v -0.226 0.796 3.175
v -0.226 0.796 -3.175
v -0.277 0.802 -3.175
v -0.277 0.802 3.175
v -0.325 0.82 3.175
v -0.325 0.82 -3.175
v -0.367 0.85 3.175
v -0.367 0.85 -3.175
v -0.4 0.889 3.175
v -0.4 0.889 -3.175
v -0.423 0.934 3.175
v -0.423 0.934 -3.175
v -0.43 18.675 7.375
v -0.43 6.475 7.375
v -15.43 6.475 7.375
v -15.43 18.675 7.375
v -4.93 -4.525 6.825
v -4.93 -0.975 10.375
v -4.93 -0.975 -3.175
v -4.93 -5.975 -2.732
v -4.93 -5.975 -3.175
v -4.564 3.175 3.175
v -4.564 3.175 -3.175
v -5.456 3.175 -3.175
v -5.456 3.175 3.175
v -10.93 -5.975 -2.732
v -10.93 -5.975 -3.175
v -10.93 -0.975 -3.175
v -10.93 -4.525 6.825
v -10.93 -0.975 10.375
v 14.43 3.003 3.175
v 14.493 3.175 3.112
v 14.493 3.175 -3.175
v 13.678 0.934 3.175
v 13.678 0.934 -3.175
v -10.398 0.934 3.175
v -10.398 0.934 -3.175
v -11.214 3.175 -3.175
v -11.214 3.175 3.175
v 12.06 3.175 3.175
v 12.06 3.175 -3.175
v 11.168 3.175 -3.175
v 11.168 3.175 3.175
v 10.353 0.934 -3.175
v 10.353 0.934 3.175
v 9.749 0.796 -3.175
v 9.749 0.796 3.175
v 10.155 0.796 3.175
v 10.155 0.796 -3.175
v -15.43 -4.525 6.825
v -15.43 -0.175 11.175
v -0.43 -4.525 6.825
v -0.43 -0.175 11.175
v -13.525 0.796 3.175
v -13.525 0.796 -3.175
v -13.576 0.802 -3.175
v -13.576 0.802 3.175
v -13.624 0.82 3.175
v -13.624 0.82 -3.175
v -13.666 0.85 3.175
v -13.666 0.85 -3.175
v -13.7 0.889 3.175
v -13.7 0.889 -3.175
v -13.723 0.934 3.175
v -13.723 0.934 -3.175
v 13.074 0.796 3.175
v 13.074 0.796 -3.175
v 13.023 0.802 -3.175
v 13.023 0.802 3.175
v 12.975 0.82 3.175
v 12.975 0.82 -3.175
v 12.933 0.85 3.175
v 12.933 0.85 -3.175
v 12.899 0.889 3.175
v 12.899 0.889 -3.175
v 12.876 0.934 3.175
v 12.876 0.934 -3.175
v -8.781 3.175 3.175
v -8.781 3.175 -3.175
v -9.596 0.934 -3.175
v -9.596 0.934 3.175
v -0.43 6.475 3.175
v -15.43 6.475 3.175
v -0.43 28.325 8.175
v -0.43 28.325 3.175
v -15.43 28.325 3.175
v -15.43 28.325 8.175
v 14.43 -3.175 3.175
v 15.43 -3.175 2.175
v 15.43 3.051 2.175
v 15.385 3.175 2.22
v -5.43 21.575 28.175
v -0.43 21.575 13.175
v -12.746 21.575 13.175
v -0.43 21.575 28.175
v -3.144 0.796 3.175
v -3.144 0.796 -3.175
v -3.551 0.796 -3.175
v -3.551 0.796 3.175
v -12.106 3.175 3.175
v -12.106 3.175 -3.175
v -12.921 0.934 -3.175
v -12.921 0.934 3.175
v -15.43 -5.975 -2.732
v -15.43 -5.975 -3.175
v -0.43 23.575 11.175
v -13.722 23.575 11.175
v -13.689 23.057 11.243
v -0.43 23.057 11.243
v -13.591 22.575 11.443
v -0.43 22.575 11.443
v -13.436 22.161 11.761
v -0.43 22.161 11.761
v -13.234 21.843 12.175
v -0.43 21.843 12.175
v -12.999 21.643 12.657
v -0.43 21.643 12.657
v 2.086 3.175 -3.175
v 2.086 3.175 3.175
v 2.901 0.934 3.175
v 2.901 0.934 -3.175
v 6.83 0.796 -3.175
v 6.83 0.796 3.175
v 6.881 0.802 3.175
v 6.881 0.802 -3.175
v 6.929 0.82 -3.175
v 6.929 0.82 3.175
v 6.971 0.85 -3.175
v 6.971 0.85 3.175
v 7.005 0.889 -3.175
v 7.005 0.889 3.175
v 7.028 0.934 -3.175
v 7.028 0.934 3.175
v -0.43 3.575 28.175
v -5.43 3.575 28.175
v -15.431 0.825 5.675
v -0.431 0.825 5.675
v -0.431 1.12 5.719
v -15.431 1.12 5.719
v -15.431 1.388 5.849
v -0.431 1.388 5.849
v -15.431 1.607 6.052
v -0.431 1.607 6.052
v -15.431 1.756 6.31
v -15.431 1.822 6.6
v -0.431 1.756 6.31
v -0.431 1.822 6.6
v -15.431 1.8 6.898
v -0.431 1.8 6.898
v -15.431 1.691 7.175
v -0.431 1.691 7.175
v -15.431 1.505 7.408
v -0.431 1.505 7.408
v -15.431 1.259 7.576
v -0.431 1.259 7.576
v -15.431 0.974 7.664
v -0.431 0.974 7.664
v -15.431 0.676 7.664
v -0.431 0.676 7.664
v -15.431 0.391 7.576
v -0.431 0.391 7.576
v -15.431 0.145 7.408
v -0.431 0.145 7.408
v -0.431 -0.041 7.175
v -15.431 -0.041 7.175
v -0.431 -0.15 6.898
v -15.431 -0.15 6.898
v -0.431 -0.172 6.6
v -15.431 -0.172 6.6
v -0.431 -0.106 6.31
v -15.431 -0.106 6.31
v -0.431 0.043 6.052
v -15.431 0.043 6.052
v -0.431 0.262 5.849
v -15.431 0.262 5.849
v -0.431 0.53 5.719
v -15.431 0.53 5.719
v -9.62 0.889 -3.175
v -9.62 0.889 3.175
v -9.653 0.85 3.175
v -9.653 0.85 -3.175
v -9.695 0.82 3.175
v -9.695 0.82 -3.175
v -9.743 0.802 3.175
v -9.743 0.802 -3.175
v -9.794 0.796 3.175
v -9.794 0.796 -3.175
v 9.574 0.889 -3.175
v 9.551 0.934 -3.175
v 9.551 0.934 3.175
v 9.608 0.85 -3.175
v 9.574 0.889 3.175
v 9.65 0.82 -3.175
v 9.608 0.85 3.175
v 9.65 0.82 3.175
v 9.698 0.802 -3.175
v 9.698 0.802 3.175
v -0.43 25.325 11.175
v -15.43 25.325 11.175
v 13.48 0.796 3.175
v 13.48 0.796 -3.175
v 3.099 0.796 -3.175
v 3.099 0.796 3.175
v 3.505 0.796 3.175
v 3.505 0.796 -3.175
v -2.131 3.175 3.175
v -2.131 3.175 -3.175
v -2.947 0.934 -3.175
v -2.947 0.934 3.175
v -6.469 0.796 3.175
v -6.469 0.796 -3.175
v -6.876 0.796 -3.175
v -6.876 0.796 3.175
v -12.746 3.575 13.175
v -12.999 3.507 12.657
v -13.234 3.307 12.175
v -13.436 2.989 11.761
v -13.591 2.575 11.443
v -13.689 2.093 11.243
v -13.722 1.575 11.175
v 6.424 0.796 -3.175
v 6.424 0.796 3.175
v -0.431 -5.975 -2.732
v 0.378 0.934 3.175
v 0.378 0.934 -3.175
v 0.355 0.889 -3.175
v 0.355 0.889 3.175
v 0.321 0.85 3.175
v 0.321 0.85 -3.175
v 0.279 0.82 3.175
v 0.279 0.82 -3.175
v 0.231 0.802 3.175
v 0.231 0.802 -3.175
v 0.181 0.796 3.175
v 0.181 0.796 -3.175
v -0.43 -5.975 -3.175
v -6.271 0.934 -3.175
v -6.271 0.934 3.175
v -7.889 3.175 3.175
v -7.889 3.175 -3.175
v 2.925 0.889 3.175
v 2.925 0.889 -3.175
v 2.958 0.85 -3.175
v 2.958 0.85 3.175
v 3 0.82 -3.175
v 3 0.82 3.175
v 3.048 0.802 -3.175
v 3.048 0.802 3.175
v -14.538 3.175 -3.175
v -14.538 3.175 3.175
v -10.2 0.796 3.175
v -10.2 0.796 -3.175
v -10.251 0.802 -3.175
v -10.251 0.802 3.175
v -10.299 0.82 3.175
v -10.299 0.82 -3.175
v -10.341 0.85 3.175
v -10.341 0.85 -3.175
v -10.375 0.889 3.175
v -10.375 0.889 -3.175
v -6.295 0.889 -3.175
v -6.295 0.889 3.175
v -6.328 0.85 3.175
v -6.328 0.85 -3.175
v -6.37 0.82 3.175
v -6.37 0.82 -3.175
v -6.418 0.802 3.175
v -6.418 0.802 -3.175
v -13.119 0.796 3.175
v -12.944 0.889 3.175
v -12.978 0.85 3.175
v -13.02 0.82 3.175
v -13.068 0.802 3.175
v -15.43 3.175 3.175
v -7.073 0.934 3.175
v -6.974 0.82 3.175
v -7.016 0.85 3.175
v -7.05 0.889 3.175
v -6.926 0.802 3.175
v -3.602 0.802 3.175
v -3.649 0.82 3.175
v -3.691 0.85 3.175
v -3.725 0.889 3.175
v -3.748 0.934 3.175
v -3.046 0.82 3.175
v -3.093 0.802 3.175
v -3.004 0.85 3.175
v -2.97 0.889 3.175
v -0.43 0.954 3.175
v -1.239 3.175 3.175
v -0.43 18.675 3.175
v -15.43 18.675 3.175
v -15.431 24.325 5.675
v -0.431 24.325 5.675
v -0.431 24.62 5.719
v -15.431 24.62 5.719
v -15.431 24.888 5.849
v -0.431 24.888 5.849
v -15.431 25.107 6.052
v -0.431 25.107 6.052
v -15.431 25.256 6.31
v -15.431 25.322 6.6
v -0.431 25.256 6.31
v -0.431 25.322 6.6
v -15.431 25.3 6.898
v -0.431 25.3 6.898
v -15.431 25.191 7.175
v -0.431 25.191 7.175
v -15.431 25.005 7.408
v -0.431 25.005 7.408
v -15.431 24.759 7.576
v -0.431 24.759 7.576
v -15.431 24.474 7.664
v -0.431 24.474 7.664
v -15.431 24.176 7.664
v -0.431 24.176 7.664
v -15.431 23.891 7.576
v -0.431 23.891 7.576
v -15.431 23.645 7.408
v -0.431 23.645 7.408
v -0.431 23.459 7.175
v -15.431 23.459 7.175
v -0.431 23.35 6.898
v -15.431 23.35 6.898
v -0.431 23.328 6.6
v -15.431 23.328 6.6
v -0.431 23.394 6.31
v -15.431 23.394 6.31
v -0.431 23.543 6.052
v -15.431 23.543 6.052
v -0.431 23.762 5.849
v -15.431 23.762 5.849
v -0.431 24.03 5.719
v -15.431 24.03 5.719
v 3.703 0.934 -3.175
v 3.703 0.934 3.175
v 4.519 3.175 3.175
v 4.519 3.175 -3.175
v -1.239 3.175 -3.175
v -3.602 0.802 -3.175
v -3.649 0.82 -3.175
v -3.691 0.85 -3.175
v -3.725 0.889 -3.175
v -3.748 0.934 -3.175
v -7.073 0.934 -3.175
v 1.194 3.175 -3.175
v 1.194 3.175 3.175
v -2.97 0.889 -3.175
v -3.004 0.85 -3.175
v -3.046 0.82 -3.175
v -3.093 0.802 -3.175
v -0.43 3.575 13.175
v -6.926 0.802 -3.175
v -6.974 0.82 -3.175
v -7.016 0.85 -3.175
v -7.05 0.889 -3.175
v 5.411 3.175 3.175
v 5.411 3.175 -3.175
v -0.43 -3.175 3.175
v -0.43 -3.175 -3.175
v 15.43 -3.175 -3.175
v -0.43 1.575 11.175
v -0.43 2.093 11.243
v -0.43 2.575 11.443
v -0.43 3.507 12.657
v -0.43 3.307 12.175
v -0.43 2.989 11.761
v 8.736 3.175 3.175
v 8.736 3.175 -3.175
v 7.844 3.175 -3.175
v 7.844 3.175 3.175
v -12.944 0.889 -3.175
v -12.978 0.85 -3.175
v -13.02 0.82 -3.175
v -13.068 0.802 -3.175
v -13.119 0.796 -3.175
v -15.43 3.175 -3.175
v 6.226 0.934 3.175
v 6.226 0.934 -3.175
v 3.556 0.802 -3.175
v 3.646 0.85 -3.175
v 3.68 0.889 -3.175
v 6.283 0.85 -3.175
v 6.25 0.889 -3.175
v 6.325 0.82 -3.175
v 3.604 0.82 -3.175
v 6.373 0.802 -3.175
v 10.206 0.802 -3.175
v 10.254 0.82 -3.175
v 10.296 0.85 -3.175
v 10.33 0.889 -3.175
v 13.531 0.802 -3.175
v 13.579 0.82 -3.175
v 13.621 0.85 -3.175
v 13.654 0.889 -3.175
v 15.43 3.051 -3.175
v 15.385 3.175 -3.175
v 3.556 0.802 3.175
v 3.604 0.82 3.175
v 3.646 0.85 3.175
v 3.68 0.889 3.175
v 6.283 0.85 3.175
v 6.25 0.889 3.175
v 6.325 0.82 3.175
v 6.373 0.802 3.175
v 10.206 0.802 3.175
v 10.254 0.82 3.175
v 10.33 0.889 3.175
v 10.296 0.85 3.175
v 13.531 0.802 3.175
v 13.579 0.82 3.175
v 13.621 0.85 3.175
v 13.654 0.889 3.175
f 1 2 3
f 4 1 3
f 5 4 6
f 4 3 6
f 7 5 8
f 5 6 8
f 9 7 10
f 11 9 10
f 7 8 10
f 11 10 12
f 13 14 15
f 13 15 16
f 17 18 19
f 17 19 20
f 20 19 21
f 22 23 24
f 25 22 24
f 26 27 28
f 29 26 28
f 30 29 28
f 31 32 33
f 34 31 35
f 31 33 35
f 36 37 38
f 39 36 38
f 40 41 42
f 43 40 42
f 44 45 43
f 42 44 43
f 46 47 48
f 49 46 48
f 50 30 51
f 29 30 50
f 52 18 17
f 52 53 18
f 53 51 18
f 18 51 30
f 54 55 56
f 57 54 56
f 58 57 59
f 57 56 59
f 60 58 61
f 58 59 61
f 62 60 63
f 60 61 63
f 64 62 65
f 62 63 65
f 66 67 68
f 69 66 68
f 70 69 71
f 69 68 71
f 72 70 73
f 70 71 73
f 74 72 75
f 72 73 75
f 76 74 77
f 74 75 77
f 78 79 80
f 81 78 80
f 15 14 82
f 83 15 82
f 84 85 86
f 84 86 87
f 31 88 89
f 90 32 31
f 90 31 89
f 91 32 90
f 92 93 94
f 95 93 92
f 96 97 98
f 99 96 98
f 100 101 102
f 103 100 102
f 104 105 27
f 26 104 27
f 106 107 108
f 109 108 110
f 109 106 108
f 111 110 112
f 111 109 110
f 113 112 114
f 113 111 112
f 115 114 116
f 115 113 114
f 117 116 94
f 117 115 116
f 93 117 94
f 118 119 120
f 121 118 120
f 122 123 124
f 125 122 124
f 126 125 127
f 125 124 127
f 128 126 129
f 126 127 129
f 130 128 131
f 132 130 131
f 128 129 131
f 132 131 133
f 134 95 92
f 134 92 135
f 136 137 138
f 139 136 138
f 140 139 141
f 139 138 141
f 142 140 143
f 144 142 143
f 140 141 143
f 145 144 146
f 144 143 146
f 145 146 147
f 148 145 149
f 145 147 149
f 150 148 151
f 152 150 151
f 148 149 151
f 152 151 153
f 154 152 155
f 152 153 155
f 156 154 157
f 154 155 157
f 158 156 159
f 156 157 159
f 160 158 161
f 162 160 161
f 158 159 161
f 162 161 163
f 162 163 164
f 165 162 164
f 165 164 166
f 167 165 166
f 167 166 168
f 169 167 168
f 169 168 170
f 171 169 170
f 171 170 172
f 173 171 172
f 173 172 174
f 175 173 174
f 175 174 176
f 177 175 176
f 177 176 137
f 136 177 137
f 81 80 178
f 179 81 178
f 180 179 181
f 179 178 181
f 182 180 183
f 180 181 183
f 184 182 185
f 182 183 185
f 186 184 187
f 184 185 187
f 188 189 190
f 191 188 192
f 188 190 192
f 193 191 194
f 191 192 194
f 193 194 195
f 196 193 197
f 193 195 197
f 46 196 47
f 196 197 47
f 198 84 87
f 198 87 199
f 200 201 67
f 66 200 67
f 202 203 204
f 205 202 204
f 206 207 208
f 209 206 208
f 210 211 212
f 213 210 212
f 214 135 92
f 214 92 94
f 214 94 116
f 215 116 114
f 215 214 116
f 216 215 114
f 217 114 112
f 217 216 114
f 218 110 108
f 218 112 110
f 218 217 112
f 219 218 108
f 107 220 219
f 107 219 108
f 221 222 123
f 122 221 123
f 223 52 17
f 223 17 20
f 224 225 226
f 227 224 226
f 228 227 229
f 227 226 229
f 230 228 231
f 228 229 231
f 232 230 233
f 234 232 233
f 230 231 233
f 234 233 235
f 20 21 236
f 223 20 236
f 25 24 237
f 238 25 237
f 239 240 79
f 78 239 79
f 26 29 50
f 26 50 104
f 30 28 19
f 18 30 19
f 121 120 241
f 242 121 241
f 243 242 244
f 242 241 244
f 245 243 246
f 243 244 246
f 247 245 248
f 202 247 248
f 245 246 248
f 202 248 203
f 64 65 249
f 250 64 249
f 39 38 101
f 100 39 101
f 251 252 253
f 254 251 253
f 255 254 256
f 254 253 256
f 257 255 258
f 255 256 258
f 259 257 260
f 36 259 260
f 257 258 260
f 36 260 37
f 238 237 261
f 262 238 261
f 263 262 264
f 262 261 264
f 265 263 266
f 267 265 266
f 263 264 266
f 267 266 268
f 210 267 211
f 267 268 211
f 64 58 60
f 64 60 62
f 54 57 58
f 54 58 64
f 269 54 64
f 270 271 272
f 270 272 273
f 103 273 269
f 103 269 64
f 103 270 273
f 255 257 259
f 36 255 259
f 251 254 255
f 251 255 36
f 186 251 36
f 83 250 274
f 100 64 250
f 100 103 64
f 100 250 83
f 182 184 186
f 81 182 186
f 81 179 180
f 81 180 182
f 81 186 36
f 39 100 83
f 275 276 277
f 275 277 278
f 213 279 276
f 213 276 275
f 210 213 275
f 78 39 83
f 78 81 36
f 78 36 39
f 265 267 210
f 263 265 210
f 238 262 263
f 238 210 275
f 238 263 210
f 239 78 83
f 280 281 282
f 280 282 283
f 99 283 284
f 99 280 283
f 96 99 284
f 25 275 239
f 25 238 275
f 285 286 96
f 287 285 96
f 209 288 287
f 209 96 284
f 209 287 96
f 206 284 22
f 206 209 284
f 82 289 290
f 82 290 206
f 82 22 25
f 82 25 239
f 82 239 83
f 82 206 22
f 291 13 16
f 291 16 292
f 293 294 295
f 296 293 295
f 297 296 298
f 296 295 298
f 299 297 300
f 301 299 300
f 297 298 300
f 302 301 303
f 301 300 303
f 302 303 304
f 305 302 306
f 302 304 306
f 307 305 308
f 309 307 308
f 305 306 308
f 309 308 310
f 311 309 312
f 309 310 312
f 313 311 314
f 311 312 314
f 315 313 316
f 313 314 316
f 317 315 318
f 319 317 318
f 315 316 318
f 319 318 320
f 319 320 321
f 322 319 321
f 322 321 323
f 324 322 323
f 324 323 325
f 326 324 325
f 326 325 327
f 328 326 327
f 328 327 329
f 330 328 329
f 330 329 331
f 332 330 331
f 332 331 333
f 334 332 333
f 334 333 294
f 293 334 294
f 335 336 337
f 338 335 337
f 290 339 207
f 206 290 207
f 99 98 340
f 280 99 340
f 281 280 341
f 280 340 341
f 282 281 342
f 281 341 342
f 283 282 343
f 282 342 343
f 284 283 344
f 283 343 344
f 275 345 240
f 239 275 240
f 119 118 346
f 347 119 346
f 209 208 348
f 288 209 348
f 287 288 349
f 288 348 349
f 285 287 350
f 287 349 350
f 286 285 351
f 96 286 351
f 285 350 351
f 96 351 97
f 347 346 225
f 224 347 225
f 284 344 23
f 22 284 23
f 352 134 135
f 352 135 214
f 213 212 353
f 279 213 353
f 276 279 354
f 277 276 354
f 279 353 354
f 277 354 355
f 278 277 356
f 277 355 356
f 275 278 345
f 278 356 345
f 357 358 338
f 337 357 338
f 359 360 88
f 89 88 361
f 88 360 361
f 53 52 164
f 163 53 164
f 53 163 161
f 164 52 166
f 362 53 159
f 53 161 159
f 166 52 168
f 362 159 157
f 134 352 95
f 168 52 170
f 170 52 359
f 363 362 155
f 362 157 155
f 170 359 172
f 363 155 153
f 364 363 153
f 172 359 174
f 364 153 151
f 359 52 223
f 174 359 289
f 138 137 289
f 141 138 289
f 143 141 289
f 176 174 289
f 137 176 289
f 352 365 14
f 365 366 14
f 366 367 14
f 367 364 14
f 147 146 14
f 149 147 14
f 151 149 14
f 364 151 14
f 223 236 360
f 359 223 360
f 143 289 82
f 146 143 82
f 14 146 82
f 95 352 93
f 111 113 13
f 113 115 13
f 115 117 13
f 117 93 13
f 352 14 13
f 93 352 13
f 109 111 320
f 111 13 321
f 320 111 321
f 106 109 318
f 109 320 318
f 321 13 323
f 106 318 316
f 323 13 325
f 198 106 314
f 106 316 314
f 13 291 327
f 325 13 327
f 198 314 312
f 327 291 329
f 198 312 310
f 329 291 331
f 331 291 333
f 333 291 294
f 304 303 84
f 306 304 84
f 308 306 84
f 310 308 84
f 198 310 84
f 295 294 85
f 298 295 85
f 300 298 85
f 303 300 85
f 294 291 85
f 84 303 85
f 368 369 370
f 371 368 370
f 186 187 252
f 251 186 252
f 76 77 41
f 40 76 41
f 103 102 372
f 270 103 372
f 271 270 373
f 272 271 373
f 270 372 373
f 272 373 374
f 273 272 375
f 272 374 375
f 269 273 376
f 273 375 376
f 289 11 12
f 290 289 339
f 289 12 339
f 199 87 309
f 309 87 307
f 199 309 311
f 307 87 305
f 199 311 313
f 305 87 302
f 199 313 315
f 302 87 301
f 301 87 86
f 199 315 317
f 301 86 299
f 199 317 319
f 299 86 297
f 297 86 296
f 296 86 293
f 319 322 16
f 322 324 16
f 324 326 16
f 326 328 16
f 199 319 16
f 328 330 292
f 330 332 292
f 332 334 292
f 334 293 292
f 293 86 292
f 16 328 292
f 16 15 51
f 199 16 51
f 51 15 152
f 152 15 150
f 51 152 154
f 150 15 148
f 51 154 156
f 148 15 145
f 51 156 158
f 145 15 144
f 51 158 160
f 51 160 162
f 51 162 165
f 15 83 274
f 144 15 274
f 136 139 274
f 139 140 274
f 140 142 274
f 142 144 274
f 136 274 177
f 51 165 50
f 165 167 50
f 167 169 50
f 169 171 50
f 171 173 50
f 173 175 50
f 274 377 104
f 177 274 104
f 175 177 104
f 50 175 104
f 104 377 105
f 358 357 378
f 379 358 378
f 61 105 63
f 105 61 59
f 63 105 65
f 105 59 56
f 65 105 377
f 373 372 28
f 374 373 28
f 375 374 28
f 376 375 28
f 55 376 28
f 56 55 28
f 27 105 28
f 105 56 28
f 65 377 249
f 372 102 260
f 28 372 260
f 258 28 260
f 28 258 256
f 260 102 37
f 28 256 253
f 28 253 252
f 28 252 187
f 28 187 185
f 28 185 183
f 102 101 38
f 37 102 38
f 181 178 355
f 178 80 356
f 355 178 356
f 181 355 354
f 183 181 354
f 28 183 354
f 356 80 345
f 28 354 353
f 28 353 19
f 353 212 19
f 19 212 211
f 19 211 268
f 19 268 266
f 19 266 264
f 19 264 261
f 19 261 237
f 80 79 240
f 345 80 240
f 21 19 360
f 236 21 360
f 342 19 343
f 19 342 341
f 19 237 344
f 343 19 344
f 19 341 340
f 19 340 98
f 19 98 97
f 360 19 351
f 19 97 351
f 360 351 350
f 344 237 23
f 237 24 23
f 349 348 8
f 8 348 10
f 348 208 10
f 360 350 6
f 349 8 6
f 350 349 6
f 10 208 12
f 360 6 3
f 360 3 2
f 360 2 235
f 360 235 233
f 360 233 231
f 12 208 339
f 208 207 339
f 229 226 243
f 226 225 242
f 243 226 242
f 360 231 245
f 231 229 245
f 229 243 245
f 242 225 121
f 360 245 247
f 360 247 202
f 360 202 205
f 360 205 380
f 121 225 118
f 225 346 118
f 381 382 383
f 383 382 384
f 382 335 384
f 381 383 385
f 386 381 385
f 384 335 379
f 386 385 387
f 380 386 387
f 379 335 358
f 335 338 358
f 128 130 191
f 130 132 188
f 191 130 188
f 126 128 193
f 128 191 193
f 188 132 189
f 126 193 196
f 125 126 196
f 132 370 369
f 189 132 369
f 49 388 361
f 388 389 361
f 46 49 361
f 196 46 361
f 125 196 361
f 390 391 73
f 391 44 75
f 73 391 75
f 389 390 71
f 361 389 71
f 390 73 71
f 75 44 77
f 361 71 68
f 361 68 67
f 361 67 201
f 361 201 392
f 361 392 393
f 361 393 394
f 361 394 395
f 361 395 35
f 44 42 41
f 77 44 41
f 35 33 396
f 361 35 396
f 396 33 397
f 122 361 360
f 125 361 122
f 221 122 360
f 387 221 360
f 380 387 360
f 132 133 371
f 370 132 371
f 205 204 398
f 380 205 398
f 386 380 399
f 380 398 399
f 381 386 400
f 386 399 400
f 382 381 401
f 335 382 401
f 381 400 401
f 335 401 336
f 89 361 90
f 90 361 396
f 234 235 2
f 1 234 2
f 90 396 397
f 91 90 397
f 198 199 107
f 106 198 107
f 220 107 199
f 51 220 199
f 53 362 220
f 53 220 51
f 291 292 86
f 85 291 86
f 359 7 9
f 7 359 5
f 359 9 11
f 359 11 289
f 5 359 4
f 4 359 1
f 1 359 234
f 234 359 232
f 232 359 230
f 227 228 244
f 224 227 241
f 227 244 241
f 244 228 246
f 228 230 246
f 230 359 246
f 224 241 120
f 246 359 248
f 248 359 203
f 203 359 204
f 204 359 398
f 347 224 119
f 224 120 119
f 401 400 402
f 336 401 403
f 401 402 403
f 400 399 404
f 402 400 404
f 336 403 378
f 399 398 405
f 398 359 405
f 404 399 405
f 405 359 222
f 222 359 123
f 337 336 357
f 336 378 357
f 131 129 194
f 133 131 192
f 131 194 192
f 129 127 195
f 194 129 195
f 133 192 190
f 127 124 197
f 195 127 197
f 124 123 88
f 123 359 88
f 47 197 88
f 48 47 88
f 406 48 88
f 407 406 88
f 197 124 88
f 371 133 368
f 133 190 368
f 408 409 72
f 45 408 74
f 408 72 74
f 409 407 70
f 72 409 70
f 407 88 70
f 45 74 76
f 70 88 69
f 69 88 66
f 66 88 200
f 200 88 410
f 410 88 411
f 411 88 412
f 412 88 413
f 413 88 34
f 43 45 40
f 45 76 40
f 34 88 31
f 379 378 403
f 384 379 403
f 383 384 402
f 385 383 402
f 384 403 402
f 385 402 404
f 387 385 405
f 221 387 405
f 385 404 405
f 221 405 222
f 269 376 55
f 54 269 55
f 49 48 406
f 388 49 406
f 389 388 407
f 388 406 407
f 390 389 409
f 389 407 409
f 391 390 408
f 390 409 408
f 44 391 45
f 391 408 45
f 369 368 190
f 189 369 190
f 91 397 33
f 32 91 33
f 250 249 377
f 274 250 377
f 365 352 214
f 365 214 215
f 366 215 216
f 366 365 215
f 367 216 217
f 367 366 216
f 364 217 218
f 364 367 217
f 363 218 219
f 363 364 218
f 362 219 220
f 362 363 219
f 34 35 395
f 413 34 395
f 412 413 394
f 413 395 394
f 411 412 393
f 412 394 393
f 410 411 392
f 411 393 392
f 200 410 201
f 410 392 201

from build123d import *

# Parameters (mm, degrees)
BOSS_EXTRUDE1_START       = -15.249880268
BOSS_EXTRUDE1_DEPTH       = 15.861
BOSS_EXTRUDE1_START_2     = -4
BOSS_EXTRUDE1_2_DEPTH     = 16
BOSS_EXTRUDE1_START_3     = 3.175
BOSS_EXTRUDE1_3_DEPTH     = 8.825
BOSS_EXTRUDE1_START_4     = -2.731818182
BOSS_EXTRUDE1_4_DEPTH     = 4.906818182
BOSS_EXTRUDE1_START_5     = -5.890415993
BOSS_EXTRUDE1_5_DEPTH     = 9.065415993
BOSS_EXTRUDE1_START_6     = -5.975
BOSS_EXTRUDE1_6_DEPTH     = 8.072424826
CUT_EXTRUDE1_DEPTH        = 0.896206897
BOSS_EXTRUDE2_DEPTH       = 0.896206897
BOSS_EXTRUDE3_DEPTH       = 0.808533663
CUT_EXTRUDE2_DEPTH        = 5.906818182
CUT_EXTRUDE3_DEPTH        = 2.8
CUT_EXTRUDE4_DEPTH        = 13.2367
BOSS_EXTRUDE4_DEPTH       = 3.691466337
CUT_EXTRUDE5_DEPTH        = 1.013180268
BOSS_EXTRUDE5_DEPTH       = 6
BOSS_EXTRUDE6_DEPTH       = 4.5
CUT_EXTRUDE6_DEPTH        = 0.611119732
BOSS_EXTRUDE7_START       = 0.443181818
BOSS_EXTRUDE7_DEPTH       = 0.443181818
BOSS_EXTRUDE8_REACH       = 36.333
CUT_EXTRUDE7_DEPTH        = 6.35
CUT_EXTRUDE8_DEPTH        = 6.35
CUT_EXTRUDE9_DEPTH        = 6.35
CUT_EXTRUDE10_DEPTH       = 6.35
CUT_EXTRUDE11_DEPTH       = 6.35
CUT_EXTRUDE12_DEPTH       = 41.809385627
CUT_EXTRUDE13_DEPTH       = 41.809385627
CUT_EXTRUDE14_DEPTH       = 41.809385627
SKETCH24_W                = 4.2
SKETCH24_H                = 12.2
CUT_EXTRUDE15_DEPTH       = 43.984969129
F_3_CLEARANCE_HOLE1_D     = 2
F_3_CLEARANCE_HOLE1_DEPTH = 30.861103078


with BuildPart() as part:
    # Boss-Extrude1: read off the stored shape, not the designer's step
    # Boss-Extrude1 outline → Boss-Extrude1 (new body)
    with BuildSketch(Plane.ZY.offset(-0.180619732).offset(BOSS_EXTRUDE1_START)):
        Polygon((-2.731818182, -5.975), (6.825, -4.525), (11.175, -0.175), (11.175, 25.325), (8.175, 28.325), (-2.731818182, 28.325), (-2.731818182, 3.175), align=None)
    extrude(amount=BOSS_EXTRUDE1_DEPTH)

    # Boss-Extrude1 2 outline → Boss-Extrude1 2 (cut)
    with BuildSketch(Plane.XY.offset(BOSS_EXTRUDE1_START_2)):
        Polygon((14.4305, 3.175), (15.385266337, 3.175), (15.4305, 3.050721534), (15.4305, 28.325), (14.4305, 28.325), align=None)
    extrude(amount=BOSS_EXTRUDE1_2_DEPTH, mode=Mode.SUBTRACT)

    # Boss-Extrude1 3 outline → Boss-Extrude1 3 (cut)
    with BuildSketch(Plane.XY.offset(BOSS_EXTRUDE1_START_3)):
        Polygon((15.4305, 3.050721534), (15.385266337, 3.175), (14.4305, 3.175), (14.4305, -5.975), (15.4305, -5.975), align=None)
    extrude(amount=BOSS_EXTRUDE1_3_DEPTH, mode=Mode.SUBTRACT)

    # Boss-Extrude1 4 outline → Boss-Extrude1 4 (add)
    with BuildSketch(Plane.XY.offset(BOSS_EXTRUDE1_START_4)):
        Polygon((15.4305, 3.050721534), (15.385266337, 3.175), (14.4305, 3.175), (14.4305, -5.975), (15.4305, -5.975), align=None)
    extrude(amount=BOSS_EXTRUDE1_4_DEPTH)

    # Boss-Extrude1 5 outline → Boss-Extrude1 5 (cut)
    with BuildSketch(Plane(origin=(0, 0, 0), x_dir=(1, 0, 0), z_dir=(0, 1, 0)).offset(BOSS_EXTRUDE1_START_5)):
        Polygon((15.4305, -2.175), (14.4305, -3.175), (15.4305, -3.175), align=None)
    extrude(amount=BOSS_EXTRUDE1_5_DEPTH, mode=Mode.SUBTRACT)

    # Boss-Extrude1 6 outline → Boss-Extrude1 6 (add)
    with BuildSketch(Plane(origin=(0, 0, 0), x_dir=(1, 0, 0), z_dir=(0, 1, 0)).offset(BOSS_EXTRUDE1_START_6)):
        Polygon((14.4305, -2.175), (14.4305, -3.175), (15.4305, -2.175), align=None)
    extrude(amount=BOSS_EXTRUDE1_6_DEPTH)

    # Sketch2 → Cut-Extrude1 (cut)
    with BuildSketch(Plane.XZ.offset(5.975)):
        Polygon((15.4305, 2.175), (14.4305, 3.175), (14.4305, -2.731818182), (15.4305, -2.731818182), align=None)
    extrude(amount=-CUT_EXTRUDE1_DEPTH, mode=Mode.SUBTRACT)

    # Sketch3 → Boss-Extrude2 (add)
    with BuildSketch(Plane.XZ.offset(5.078793103)):
        Polygon((14.4305, 3.175), (15.4305, 2.175), (15.4305, -2.731818182), (14.4305, -2.731818182), align=None)
    extrude(amount=BOSS_EXTRUDE2_DEPTH)

    # Sketch4 → Boss-Extrude3 (add)
    with BuildSketch(Plane.ZY.offset(0.4305)):
        Polygon((-2.731818182, -5.975), (-2.731818182, 28.325), (8.175, 28.325), (11.175, 25.325), (11.175, -0.175), (6.825, -4.525), align=None)
    extrude(amount=BOSS_EXTRUDE3_DEPTH)

    # Sketch5 → Cut-Extrude2 (cut)
    with BuildSketch(Plane(origin=(0, 0, -2.731818182), x_dir=(-1, 0, 0), z_dir=(0, 0, -1))):
        with BuildLine():
            Line((1.239033663, 3.175), (1.239033663, 28.325))
            Line((1.239033663, 28.325), (-14.4305, 28.325))
            Line((-14.4305, 28.325), (-14.4305, 3.175))
            Line((-14.4305, 3.175), (-1.1938, 3.175))
            Line((-1.1938, 3.175), (-0.37822757, 0.934233164))
            ThreePointArc((-0.37822757, 0.934233164), (-0.301237046, 0.83389716), (-0.180619732, 0.795866667))
            Line((-0.180619732, 0.795866667), (0.225853395, 0.795866667))
            ThreePointArc((0.225853395, 0.795866667), (0.346470708, 0.83389716), (0.423461232, 0.934233164))
            Line((0.423461232, 0.934233164), (1.239033663, 3.175))
        make_face()
    extrude(amount=-CUT_EXTRUDE2_DEPTH, mode=Mode.SUBTRACT)

    # Sketch6 → Cut-Extrude3 (cut)
    with BuildSketch(Plane.XZ.offset(5.975)):
        Polygon((15.4305, 2.175), (14.4305, 3.175), (14.4305, -2.731818182), (15.4305, -2.731818182), align=None)
    extrude(amount=-CUT_EXTRUDE3_DEPTH, mode=Mode.SUBTRACT)

    # Sketch7 → Cut-Extrude4 (cut)
    with BuildSketch(Plane(origin=(14.4305, 0, 0), x_dir=(0, 0, -1), z_dir=(1, 0, 0))):
        Polygon((2.731818182, -5.975), (2.731818182, -3.175), (-3.175, -3.175), (-3.175, 3.175), (-3.175, 28.325), (-8.175, 28.325), (-11.175, 25.325), (-11.175, -0.175), (-6.825, -4.525), align=None)
    extrude(amount=-CUT_EXTRUDE4_DEPTH, mode=Mode.SUBTRACT)

    # Sketch8 → Boss-Extrude4 (add)
    with BuildSketch(Plane.ZY.offset(1.239033663)):
        Polygon((-2.731818182, -5.975), (-2.731818182, 3.175), (3.175, 3.175), (3.175, 28.325), (8.175, 28.325), (11.175, 25.325), (11.175, -0.175), (6.825, -4.525), align=None)
    extrude(amount=BOSS_EXTRUDE4_DEPTH)

    # Sketch9 → Cut-Extrude5 (cut)
    with BuildSketch(Plane(origin=(1.1938, 0, 0), x_dir=(0, 0, -1), z_dir=(1, 0, 0))):
        Polygon((2.731818182, -5.975), (2.731818182, -3.175), (-3.175, -3.175), (-3.175, 0.795866667), (-3.175, 28.325), (-8.175, 28.325), (-11.175, 25.325), (-11.175, -0.175), (-6.825, -4.525), align=None)
    extrude(amount=-CUT_EXTRUDE5_DEPTH, mode=Mode.SUBTRACT)

    # Sketch10 → Boss-Extrude5 (add)
    with BuildSketch(Plane.ZY.offset(4.9305)):
        Polygon((10.375, -0.975), (-2.731818182, -0.975), (-2.731818182, 3.175), (3.175, 3.175), (3.175, 28.325), (8.175, 28.325), (11.175, 25.325), (11.175, -0.175), align=None)
    extrude(amount=BOSS_EXTRUDE5_DEPTH)

    # Sketch11 → Boss-Extrude6 (add)
    with BuildSketch(Plane.ZY.offset(10.9305)):
        Polygon((-2.731818182, 3.175), (3.175, 3.175), (3.175, 28.325), (8.175, 28.325), (11.175, 25.325), (11.175, -0.175), (6.825, -4.525), (-2.731818182, -5.975), align=None)
    extrude(amount=BOSS_EXTRUDE6_DEPTH)

    # Sketch12 → Cut-Extrude6 (cut)
    with BuildSketch(Plane(origin=(0.180619732, 0, 0), x_dir=(0, 0, -1), z_dir=(1, 0, 0))):
        Polygon((2.731818182, -5.975), (2.731818182, -3.175), (-3.175, -3.175), (-3.175, 0.953572019), (-3.175, 28.325), (-8.175, 28.325), (-11.175, 25.325), (-11.175, -0.175), (-6.825, -4.525), align=None)
    extrude(amount=-CUT_EXTRUDE6_DEPTH, mode=Mode.SUBTRACT)

    # Sketch13 → Boss-Extrude7 (add)
    with BuildSketch(Plane(origin=(0, 0, -2.731818182), x_dir=(-1, 0, 0), z_dir=(0, 0, -1)).offset(BOSS_EXTRUDE7_START)):
        with BuildLine():
            Line((-1.1938, 3.175), (-0.37822757, 0.934233164))
            ThreePointArc((-0.37822757, 0.934233164), (-0.301237046, 0.83389716), (-0.180619732, 0.795866667))
            Line((-0.180619732, 0.795866667), (0.225853395, 0.795866667))
            ThreePointArc((0.225853395, 0.795866667), (0.346470708, 0.83389716), (0.423461232, 0.934233164))
            Line((0.423461232, 0.934233164), (1.239033663, 3.175))
            Line((1.239033663, 3.175), (15.4305, 3.175))
            Line((15.4305, 3.175), (15.4305, -5.975))
            Line((15.4305, -5.975), (10.9305, -5.975))
            Line((10.9305, -5.975), (10.9305, -0.975))
            Line((10.9305, -0.975), (4.9305, -0.975))
            Line((4.9305, -0.975), (4.9305, -5.975))
            Line((4.9305, -5.975), (0.4305, -5.975))
            Line((0.4305, -5.975), (0.4305, -3.175))
            Line((0.4305, -3.175), (-15.4305, -3.175))
            Line((-15.4305, -3.175), (-15.4305, 3.050721534))
            Line((-15.4305, 3.050721534), (-15.385266337, 3.175))
            Line((-15.385266337, 3.175), (-1.1938, 3.175))
        make_face()
    extrude(amount=-BOSS_EXTRUDE7_DEPTH)

    # Boss-Extrude8: up to this plane
    boss_extrude8_end = Plane(origin=(-15.488026312, 0, 7.554015165), z_dir=(-0.8987940462991697, 0, 0.438371146789072))
    # Sketch15 → Boss-Extrude8 (add, up to the surface)
    with BuildSketch(Plane(origin=(-0.4305, 0, 0), x_dir=(0, 0, -1), z_dir=(1, 0, 0)), mode=Mode.PRIVATE) as boss_extrude8_sk1:
        with BuildLine():
            Line((-11.175, 1.575), (-11.175, 23.575))
            ThreePointArc((-11.175, 23.575), (-11.760786438, 22.160786438), (-13.175, 21.575))
            Line((-13.175, 21.575), (-28.175, 21.575))
            Line((-28.175, 21.575), (-28.175, 3.575))
            Line((-28.175, 3.575), (-13.175, 3.575))
            ThreePointArc((-13.175, 3.575), (-11.760786438, 2.989213562), (-11.175, 1.575))
        make_face()
    boss_extrude8_tool1 = split(extrude(boss_extrude8_sk1.sketch, amount=-BOSS_EXTRUDE8_REACH, mode=Mode.PRIVATE), bisect_by=boss_extrude8_end, keep=Keep.BOTH, mode=Mode.PRIVATE)
    add(boss_extrude8_tool1.solids().sort_by_distance((-0.4305, 12.575, 19.630069))[0])

    # Sketch16 → Cut-Extrude7 (cut)
    with BuildSketch(Plane(origin=(0, 0, -3.175), x_dir=(-1, 0, 0), z_dir=(0, 0, -1))):
        with BuildLine():
            Line((3.748321232, 0.934233164), (4.563893663, 3.175))
            Line((4.563893663, 3.175), (2.13106, 3.175))
            Line((2.13106, 3.175), (2.94663243, 0.934233164))
            ThreePointArc((2.94663243, 0.934233164), (3.023622954, 0.83389716), (3.144240268, 0.795866667))
            Line((3.144240268, 0.795866667), (3.550713395, 0.795866667))
            ThreePointArc((3.550713395, 0.795866667), (3.671330708, 0.83389716), (3.748321232, 0.934233164))
        make_face()
    extrude(amount=-CUT_EXTRUDE7_DEPTH, mode=Mode.SUBTRACT)

    # Sketch17 → Cut-Extrude8 (cut)
    with BuildSketch(Plane(origin=(0, 0, -3.175), x_dir=(-1, 0, 0), z_dir=(0, 0, -1))):
        with BuildLine():
            Line((7.073181232, 0.934233164), (7.888753663, 3.175))
            Line((7.888753663, 3.175), (5.45592, 3.175))
            Line((5.45592, 3.175), (6.27149243, 0.934233164))
            ThreePointArc((6.27149243, 0.934233164), (6.348482954, 0.83389716), (6.469100268, 0.795866667))
            Line((6.469100268, 0.795866667), (6.875573395, 0.795866667))
            ThreePointArc((6.875573395, 0.795866667), (6.996190708, 0.83389716), (7.073181232, 0.934233164))
        make_face()
    extrude(amount=-CUT_EXTRUDE8_DEPTH, mode=Mode.SUBTRACT)

    # Sketch18 → Cut-Extrude9 (cut)
    with BuildSketch(Plane(origin=(0, 0, -3.175), x_dir=(-1, 0, 0), z_dir=(0, 0, -1))):
        with BuildLine():
            Line((10.398041232, 0.934233164), (11.213613663, 3.175))
            Line((11.213613663, 3.175), (8.78078, 3.175))
            Line((8.78078, 3.175), (9.59635243, 0.934233164))
            ThreePointArc((9.59635243, 0.934233164), (9.673342954, 0.83389716), (9.793960268, 0.795866667))
            Line((9.793960268, 0.795866667), (10.200433395, 0.795866667))
            ThreePointArc((10.200433395, 0.795866667), (10.321050708, 0.83389716), (10.398041232, 0.934233164))
        make_face()
    extrude(amount=-CUT_EXTRUDE9_DEPTH, mode=Mode.SUBTRACT)

    # Sketch19 → Cut-Extrude10 (cut)
    with BuildSketch(Plane(origin=(0, 0, -3.175), x_dir=(-1, 0, 0), z_dir=(0, 0, -1))):
        with BuildLine():
            Line((13.722901232, 0.934233164), (14.538473663, 3.175))
            Line((14.538473663, 3.175), (12.10564, 3.175))
            Line((12.10564, 3.175), (12.92121243, 0.934233164))
            ThreePointArc((12.92121243, 0.934233164), (12.998202954, 0.83389716), (13.118820268, 0.795866667))
            Line((13.118820268, 0.795866667), (13.525293395, 0.795866667))
            ThreePointArc((13.525293395, 0.795866667), (13.645910708, 0.83389716), (13.722901232, 0.934233164))
        make_face()
    extrude(amount=-CUT_EXTRUDE10_DEPTH, mode=Mode.SUBTRACT)

    # Sketch20 → Cut-Extrude11 (cut)
    with BuildSketch(Plane(origin=(0, 0, -3.175), x_dir=(-1, 0, 0), z_dir=(0, 0, -1))):
        with BuildLine():
            Line((-12.060406337, 3.175), (-14.49324, 3.175))
            Line((-14.49324, 3.175), (-13.67766757, 0.934233164))
            ThreePointArc((-13.67766757, 0.934233164), (-13.600677046, 0.83389716), (-13.480059732, 0.795866667))
            Line((-13.480059732, 0.795866667), (-13.073586605, 0.795866667))
            ThreePointArc((-13.073586605, 0.795866667), (-12.952969292, 0.83389716), (-12.875978768, 0.934233164))
            Line((-12.875978768, 0.934233164), (-12.060406337, 3.175))
        make_face()
    extrude(amount=-CUT_EXTRUDE11_DEPTH, mode=Mode.SUBTRACT)

    # Sketch21 → Cut-Extrude12 (cut, through all)
    with BuildSketch(Plane.XY.offset(3.175)):
        with BuildLine():
            Line((2.085826337, 3.175), (2.901398768, 0.934233164))
            ThreePointArc((2.901398768, 0.934233164), (2.978389292, 0.83389716), (3.099006605, 0.795866667))
            Line((3.099006605, 0.795866667), (3.505479732, 0.795866667))
            ThreePointArc((3.505479732, 0.795866667), (3.626097046, 0.83389716), (3.70308757, 0.934233164))
            Line((3.70308757, 0.934233164), (4.51866, 3.175))
            Line((4.51866, 3.175), (2.085826337, 3.175))
        make_face()
    extrude(amount=-CUT_EXTRUDE12_DEPTH, mode=Mode.SUBTRACT)

    # Sketch22 → Cut-Extrude13 (cut, through all)
    with BuildSketch(Plane.XY.offset(3.175)):
        with BuildLine():
            Line((5.410686337, 3.175), (6.226258768, 0.934233164))
            ThreePointArc((6.226258768, 0.934233164), (6.303249292, 0.83389716), (6.423866605, 0.795866667))
            Line((6.423866605, 0.795866667), (6.830339732, 0.795866667))
            ThreePointArc((6.830339732, 0.795866667), (6.950957046, 0.83389716), (7.02794757, 0.934233164))
            Line((7.02794757, 0.934233164), (7.84352, 3.175))
            Line((7.84352, 3.175), (5.410686337, 3.175))
        make_face()
    extrude(amount=-CUT_EXTRUDE13_DEPTH, mode=Mode.SUBTRACT)

    # Sketch23 → Cut-Extrude14 (cut, through all)
    with BuildSketch(Plane.XY.offset(3.175)):
        with BuildLine():
            Line((8.735546337, 3.175), (9.551118768, 0.934233164))
            ThreePointArc((9.551118768, 0.934233164), (9.628109292, 0.83389716), (9.748726605, 0.795866667))
            Line((9.748726605, 0.795866667), (10.155199732, 0.795866667))
            ThreePointArc((10.155199732, 0.795866667), (10.275817046, 0.83389716), (10.35280757, 0.934233164))
            Line((10.35280757, 0.934233164), (11.16838, 3.175))
            Line((11.16838, 3.175), (8.735546337, 3.175))
        make_face()
    extrude(amount=-CUT_EXTRUDE14_DEPTH, mode=Mode.SUBTRACT)

    # Sketch24 → Cut-Extrude15 (cut, through all)
    with BuildSketch(Plane(origin=(-0.4305, 0, 0), x_dir=(0, 0, -1), z_dir=(1, 0, 0))):
        with Locations((-5.275, 12.575)):
            Rectangle(SKETCH24_W, SKETCH24_H)
    extrude(amount=-CUT_EXTRUDE15_DEPTH, mode=Mode.SUBTRACT)

    # #3 Clearance Hole1
    with Locations(Plane.ZY.offset(15.4305)):
        with Locations((6.675, 24.325), (6.675, 0.825)):
            Hole(F_3_CLEARANCE_HOLE1_D / 2, depth=F_3_CLEARANCE_HOLE1_DEPTH)


solid = part.part
